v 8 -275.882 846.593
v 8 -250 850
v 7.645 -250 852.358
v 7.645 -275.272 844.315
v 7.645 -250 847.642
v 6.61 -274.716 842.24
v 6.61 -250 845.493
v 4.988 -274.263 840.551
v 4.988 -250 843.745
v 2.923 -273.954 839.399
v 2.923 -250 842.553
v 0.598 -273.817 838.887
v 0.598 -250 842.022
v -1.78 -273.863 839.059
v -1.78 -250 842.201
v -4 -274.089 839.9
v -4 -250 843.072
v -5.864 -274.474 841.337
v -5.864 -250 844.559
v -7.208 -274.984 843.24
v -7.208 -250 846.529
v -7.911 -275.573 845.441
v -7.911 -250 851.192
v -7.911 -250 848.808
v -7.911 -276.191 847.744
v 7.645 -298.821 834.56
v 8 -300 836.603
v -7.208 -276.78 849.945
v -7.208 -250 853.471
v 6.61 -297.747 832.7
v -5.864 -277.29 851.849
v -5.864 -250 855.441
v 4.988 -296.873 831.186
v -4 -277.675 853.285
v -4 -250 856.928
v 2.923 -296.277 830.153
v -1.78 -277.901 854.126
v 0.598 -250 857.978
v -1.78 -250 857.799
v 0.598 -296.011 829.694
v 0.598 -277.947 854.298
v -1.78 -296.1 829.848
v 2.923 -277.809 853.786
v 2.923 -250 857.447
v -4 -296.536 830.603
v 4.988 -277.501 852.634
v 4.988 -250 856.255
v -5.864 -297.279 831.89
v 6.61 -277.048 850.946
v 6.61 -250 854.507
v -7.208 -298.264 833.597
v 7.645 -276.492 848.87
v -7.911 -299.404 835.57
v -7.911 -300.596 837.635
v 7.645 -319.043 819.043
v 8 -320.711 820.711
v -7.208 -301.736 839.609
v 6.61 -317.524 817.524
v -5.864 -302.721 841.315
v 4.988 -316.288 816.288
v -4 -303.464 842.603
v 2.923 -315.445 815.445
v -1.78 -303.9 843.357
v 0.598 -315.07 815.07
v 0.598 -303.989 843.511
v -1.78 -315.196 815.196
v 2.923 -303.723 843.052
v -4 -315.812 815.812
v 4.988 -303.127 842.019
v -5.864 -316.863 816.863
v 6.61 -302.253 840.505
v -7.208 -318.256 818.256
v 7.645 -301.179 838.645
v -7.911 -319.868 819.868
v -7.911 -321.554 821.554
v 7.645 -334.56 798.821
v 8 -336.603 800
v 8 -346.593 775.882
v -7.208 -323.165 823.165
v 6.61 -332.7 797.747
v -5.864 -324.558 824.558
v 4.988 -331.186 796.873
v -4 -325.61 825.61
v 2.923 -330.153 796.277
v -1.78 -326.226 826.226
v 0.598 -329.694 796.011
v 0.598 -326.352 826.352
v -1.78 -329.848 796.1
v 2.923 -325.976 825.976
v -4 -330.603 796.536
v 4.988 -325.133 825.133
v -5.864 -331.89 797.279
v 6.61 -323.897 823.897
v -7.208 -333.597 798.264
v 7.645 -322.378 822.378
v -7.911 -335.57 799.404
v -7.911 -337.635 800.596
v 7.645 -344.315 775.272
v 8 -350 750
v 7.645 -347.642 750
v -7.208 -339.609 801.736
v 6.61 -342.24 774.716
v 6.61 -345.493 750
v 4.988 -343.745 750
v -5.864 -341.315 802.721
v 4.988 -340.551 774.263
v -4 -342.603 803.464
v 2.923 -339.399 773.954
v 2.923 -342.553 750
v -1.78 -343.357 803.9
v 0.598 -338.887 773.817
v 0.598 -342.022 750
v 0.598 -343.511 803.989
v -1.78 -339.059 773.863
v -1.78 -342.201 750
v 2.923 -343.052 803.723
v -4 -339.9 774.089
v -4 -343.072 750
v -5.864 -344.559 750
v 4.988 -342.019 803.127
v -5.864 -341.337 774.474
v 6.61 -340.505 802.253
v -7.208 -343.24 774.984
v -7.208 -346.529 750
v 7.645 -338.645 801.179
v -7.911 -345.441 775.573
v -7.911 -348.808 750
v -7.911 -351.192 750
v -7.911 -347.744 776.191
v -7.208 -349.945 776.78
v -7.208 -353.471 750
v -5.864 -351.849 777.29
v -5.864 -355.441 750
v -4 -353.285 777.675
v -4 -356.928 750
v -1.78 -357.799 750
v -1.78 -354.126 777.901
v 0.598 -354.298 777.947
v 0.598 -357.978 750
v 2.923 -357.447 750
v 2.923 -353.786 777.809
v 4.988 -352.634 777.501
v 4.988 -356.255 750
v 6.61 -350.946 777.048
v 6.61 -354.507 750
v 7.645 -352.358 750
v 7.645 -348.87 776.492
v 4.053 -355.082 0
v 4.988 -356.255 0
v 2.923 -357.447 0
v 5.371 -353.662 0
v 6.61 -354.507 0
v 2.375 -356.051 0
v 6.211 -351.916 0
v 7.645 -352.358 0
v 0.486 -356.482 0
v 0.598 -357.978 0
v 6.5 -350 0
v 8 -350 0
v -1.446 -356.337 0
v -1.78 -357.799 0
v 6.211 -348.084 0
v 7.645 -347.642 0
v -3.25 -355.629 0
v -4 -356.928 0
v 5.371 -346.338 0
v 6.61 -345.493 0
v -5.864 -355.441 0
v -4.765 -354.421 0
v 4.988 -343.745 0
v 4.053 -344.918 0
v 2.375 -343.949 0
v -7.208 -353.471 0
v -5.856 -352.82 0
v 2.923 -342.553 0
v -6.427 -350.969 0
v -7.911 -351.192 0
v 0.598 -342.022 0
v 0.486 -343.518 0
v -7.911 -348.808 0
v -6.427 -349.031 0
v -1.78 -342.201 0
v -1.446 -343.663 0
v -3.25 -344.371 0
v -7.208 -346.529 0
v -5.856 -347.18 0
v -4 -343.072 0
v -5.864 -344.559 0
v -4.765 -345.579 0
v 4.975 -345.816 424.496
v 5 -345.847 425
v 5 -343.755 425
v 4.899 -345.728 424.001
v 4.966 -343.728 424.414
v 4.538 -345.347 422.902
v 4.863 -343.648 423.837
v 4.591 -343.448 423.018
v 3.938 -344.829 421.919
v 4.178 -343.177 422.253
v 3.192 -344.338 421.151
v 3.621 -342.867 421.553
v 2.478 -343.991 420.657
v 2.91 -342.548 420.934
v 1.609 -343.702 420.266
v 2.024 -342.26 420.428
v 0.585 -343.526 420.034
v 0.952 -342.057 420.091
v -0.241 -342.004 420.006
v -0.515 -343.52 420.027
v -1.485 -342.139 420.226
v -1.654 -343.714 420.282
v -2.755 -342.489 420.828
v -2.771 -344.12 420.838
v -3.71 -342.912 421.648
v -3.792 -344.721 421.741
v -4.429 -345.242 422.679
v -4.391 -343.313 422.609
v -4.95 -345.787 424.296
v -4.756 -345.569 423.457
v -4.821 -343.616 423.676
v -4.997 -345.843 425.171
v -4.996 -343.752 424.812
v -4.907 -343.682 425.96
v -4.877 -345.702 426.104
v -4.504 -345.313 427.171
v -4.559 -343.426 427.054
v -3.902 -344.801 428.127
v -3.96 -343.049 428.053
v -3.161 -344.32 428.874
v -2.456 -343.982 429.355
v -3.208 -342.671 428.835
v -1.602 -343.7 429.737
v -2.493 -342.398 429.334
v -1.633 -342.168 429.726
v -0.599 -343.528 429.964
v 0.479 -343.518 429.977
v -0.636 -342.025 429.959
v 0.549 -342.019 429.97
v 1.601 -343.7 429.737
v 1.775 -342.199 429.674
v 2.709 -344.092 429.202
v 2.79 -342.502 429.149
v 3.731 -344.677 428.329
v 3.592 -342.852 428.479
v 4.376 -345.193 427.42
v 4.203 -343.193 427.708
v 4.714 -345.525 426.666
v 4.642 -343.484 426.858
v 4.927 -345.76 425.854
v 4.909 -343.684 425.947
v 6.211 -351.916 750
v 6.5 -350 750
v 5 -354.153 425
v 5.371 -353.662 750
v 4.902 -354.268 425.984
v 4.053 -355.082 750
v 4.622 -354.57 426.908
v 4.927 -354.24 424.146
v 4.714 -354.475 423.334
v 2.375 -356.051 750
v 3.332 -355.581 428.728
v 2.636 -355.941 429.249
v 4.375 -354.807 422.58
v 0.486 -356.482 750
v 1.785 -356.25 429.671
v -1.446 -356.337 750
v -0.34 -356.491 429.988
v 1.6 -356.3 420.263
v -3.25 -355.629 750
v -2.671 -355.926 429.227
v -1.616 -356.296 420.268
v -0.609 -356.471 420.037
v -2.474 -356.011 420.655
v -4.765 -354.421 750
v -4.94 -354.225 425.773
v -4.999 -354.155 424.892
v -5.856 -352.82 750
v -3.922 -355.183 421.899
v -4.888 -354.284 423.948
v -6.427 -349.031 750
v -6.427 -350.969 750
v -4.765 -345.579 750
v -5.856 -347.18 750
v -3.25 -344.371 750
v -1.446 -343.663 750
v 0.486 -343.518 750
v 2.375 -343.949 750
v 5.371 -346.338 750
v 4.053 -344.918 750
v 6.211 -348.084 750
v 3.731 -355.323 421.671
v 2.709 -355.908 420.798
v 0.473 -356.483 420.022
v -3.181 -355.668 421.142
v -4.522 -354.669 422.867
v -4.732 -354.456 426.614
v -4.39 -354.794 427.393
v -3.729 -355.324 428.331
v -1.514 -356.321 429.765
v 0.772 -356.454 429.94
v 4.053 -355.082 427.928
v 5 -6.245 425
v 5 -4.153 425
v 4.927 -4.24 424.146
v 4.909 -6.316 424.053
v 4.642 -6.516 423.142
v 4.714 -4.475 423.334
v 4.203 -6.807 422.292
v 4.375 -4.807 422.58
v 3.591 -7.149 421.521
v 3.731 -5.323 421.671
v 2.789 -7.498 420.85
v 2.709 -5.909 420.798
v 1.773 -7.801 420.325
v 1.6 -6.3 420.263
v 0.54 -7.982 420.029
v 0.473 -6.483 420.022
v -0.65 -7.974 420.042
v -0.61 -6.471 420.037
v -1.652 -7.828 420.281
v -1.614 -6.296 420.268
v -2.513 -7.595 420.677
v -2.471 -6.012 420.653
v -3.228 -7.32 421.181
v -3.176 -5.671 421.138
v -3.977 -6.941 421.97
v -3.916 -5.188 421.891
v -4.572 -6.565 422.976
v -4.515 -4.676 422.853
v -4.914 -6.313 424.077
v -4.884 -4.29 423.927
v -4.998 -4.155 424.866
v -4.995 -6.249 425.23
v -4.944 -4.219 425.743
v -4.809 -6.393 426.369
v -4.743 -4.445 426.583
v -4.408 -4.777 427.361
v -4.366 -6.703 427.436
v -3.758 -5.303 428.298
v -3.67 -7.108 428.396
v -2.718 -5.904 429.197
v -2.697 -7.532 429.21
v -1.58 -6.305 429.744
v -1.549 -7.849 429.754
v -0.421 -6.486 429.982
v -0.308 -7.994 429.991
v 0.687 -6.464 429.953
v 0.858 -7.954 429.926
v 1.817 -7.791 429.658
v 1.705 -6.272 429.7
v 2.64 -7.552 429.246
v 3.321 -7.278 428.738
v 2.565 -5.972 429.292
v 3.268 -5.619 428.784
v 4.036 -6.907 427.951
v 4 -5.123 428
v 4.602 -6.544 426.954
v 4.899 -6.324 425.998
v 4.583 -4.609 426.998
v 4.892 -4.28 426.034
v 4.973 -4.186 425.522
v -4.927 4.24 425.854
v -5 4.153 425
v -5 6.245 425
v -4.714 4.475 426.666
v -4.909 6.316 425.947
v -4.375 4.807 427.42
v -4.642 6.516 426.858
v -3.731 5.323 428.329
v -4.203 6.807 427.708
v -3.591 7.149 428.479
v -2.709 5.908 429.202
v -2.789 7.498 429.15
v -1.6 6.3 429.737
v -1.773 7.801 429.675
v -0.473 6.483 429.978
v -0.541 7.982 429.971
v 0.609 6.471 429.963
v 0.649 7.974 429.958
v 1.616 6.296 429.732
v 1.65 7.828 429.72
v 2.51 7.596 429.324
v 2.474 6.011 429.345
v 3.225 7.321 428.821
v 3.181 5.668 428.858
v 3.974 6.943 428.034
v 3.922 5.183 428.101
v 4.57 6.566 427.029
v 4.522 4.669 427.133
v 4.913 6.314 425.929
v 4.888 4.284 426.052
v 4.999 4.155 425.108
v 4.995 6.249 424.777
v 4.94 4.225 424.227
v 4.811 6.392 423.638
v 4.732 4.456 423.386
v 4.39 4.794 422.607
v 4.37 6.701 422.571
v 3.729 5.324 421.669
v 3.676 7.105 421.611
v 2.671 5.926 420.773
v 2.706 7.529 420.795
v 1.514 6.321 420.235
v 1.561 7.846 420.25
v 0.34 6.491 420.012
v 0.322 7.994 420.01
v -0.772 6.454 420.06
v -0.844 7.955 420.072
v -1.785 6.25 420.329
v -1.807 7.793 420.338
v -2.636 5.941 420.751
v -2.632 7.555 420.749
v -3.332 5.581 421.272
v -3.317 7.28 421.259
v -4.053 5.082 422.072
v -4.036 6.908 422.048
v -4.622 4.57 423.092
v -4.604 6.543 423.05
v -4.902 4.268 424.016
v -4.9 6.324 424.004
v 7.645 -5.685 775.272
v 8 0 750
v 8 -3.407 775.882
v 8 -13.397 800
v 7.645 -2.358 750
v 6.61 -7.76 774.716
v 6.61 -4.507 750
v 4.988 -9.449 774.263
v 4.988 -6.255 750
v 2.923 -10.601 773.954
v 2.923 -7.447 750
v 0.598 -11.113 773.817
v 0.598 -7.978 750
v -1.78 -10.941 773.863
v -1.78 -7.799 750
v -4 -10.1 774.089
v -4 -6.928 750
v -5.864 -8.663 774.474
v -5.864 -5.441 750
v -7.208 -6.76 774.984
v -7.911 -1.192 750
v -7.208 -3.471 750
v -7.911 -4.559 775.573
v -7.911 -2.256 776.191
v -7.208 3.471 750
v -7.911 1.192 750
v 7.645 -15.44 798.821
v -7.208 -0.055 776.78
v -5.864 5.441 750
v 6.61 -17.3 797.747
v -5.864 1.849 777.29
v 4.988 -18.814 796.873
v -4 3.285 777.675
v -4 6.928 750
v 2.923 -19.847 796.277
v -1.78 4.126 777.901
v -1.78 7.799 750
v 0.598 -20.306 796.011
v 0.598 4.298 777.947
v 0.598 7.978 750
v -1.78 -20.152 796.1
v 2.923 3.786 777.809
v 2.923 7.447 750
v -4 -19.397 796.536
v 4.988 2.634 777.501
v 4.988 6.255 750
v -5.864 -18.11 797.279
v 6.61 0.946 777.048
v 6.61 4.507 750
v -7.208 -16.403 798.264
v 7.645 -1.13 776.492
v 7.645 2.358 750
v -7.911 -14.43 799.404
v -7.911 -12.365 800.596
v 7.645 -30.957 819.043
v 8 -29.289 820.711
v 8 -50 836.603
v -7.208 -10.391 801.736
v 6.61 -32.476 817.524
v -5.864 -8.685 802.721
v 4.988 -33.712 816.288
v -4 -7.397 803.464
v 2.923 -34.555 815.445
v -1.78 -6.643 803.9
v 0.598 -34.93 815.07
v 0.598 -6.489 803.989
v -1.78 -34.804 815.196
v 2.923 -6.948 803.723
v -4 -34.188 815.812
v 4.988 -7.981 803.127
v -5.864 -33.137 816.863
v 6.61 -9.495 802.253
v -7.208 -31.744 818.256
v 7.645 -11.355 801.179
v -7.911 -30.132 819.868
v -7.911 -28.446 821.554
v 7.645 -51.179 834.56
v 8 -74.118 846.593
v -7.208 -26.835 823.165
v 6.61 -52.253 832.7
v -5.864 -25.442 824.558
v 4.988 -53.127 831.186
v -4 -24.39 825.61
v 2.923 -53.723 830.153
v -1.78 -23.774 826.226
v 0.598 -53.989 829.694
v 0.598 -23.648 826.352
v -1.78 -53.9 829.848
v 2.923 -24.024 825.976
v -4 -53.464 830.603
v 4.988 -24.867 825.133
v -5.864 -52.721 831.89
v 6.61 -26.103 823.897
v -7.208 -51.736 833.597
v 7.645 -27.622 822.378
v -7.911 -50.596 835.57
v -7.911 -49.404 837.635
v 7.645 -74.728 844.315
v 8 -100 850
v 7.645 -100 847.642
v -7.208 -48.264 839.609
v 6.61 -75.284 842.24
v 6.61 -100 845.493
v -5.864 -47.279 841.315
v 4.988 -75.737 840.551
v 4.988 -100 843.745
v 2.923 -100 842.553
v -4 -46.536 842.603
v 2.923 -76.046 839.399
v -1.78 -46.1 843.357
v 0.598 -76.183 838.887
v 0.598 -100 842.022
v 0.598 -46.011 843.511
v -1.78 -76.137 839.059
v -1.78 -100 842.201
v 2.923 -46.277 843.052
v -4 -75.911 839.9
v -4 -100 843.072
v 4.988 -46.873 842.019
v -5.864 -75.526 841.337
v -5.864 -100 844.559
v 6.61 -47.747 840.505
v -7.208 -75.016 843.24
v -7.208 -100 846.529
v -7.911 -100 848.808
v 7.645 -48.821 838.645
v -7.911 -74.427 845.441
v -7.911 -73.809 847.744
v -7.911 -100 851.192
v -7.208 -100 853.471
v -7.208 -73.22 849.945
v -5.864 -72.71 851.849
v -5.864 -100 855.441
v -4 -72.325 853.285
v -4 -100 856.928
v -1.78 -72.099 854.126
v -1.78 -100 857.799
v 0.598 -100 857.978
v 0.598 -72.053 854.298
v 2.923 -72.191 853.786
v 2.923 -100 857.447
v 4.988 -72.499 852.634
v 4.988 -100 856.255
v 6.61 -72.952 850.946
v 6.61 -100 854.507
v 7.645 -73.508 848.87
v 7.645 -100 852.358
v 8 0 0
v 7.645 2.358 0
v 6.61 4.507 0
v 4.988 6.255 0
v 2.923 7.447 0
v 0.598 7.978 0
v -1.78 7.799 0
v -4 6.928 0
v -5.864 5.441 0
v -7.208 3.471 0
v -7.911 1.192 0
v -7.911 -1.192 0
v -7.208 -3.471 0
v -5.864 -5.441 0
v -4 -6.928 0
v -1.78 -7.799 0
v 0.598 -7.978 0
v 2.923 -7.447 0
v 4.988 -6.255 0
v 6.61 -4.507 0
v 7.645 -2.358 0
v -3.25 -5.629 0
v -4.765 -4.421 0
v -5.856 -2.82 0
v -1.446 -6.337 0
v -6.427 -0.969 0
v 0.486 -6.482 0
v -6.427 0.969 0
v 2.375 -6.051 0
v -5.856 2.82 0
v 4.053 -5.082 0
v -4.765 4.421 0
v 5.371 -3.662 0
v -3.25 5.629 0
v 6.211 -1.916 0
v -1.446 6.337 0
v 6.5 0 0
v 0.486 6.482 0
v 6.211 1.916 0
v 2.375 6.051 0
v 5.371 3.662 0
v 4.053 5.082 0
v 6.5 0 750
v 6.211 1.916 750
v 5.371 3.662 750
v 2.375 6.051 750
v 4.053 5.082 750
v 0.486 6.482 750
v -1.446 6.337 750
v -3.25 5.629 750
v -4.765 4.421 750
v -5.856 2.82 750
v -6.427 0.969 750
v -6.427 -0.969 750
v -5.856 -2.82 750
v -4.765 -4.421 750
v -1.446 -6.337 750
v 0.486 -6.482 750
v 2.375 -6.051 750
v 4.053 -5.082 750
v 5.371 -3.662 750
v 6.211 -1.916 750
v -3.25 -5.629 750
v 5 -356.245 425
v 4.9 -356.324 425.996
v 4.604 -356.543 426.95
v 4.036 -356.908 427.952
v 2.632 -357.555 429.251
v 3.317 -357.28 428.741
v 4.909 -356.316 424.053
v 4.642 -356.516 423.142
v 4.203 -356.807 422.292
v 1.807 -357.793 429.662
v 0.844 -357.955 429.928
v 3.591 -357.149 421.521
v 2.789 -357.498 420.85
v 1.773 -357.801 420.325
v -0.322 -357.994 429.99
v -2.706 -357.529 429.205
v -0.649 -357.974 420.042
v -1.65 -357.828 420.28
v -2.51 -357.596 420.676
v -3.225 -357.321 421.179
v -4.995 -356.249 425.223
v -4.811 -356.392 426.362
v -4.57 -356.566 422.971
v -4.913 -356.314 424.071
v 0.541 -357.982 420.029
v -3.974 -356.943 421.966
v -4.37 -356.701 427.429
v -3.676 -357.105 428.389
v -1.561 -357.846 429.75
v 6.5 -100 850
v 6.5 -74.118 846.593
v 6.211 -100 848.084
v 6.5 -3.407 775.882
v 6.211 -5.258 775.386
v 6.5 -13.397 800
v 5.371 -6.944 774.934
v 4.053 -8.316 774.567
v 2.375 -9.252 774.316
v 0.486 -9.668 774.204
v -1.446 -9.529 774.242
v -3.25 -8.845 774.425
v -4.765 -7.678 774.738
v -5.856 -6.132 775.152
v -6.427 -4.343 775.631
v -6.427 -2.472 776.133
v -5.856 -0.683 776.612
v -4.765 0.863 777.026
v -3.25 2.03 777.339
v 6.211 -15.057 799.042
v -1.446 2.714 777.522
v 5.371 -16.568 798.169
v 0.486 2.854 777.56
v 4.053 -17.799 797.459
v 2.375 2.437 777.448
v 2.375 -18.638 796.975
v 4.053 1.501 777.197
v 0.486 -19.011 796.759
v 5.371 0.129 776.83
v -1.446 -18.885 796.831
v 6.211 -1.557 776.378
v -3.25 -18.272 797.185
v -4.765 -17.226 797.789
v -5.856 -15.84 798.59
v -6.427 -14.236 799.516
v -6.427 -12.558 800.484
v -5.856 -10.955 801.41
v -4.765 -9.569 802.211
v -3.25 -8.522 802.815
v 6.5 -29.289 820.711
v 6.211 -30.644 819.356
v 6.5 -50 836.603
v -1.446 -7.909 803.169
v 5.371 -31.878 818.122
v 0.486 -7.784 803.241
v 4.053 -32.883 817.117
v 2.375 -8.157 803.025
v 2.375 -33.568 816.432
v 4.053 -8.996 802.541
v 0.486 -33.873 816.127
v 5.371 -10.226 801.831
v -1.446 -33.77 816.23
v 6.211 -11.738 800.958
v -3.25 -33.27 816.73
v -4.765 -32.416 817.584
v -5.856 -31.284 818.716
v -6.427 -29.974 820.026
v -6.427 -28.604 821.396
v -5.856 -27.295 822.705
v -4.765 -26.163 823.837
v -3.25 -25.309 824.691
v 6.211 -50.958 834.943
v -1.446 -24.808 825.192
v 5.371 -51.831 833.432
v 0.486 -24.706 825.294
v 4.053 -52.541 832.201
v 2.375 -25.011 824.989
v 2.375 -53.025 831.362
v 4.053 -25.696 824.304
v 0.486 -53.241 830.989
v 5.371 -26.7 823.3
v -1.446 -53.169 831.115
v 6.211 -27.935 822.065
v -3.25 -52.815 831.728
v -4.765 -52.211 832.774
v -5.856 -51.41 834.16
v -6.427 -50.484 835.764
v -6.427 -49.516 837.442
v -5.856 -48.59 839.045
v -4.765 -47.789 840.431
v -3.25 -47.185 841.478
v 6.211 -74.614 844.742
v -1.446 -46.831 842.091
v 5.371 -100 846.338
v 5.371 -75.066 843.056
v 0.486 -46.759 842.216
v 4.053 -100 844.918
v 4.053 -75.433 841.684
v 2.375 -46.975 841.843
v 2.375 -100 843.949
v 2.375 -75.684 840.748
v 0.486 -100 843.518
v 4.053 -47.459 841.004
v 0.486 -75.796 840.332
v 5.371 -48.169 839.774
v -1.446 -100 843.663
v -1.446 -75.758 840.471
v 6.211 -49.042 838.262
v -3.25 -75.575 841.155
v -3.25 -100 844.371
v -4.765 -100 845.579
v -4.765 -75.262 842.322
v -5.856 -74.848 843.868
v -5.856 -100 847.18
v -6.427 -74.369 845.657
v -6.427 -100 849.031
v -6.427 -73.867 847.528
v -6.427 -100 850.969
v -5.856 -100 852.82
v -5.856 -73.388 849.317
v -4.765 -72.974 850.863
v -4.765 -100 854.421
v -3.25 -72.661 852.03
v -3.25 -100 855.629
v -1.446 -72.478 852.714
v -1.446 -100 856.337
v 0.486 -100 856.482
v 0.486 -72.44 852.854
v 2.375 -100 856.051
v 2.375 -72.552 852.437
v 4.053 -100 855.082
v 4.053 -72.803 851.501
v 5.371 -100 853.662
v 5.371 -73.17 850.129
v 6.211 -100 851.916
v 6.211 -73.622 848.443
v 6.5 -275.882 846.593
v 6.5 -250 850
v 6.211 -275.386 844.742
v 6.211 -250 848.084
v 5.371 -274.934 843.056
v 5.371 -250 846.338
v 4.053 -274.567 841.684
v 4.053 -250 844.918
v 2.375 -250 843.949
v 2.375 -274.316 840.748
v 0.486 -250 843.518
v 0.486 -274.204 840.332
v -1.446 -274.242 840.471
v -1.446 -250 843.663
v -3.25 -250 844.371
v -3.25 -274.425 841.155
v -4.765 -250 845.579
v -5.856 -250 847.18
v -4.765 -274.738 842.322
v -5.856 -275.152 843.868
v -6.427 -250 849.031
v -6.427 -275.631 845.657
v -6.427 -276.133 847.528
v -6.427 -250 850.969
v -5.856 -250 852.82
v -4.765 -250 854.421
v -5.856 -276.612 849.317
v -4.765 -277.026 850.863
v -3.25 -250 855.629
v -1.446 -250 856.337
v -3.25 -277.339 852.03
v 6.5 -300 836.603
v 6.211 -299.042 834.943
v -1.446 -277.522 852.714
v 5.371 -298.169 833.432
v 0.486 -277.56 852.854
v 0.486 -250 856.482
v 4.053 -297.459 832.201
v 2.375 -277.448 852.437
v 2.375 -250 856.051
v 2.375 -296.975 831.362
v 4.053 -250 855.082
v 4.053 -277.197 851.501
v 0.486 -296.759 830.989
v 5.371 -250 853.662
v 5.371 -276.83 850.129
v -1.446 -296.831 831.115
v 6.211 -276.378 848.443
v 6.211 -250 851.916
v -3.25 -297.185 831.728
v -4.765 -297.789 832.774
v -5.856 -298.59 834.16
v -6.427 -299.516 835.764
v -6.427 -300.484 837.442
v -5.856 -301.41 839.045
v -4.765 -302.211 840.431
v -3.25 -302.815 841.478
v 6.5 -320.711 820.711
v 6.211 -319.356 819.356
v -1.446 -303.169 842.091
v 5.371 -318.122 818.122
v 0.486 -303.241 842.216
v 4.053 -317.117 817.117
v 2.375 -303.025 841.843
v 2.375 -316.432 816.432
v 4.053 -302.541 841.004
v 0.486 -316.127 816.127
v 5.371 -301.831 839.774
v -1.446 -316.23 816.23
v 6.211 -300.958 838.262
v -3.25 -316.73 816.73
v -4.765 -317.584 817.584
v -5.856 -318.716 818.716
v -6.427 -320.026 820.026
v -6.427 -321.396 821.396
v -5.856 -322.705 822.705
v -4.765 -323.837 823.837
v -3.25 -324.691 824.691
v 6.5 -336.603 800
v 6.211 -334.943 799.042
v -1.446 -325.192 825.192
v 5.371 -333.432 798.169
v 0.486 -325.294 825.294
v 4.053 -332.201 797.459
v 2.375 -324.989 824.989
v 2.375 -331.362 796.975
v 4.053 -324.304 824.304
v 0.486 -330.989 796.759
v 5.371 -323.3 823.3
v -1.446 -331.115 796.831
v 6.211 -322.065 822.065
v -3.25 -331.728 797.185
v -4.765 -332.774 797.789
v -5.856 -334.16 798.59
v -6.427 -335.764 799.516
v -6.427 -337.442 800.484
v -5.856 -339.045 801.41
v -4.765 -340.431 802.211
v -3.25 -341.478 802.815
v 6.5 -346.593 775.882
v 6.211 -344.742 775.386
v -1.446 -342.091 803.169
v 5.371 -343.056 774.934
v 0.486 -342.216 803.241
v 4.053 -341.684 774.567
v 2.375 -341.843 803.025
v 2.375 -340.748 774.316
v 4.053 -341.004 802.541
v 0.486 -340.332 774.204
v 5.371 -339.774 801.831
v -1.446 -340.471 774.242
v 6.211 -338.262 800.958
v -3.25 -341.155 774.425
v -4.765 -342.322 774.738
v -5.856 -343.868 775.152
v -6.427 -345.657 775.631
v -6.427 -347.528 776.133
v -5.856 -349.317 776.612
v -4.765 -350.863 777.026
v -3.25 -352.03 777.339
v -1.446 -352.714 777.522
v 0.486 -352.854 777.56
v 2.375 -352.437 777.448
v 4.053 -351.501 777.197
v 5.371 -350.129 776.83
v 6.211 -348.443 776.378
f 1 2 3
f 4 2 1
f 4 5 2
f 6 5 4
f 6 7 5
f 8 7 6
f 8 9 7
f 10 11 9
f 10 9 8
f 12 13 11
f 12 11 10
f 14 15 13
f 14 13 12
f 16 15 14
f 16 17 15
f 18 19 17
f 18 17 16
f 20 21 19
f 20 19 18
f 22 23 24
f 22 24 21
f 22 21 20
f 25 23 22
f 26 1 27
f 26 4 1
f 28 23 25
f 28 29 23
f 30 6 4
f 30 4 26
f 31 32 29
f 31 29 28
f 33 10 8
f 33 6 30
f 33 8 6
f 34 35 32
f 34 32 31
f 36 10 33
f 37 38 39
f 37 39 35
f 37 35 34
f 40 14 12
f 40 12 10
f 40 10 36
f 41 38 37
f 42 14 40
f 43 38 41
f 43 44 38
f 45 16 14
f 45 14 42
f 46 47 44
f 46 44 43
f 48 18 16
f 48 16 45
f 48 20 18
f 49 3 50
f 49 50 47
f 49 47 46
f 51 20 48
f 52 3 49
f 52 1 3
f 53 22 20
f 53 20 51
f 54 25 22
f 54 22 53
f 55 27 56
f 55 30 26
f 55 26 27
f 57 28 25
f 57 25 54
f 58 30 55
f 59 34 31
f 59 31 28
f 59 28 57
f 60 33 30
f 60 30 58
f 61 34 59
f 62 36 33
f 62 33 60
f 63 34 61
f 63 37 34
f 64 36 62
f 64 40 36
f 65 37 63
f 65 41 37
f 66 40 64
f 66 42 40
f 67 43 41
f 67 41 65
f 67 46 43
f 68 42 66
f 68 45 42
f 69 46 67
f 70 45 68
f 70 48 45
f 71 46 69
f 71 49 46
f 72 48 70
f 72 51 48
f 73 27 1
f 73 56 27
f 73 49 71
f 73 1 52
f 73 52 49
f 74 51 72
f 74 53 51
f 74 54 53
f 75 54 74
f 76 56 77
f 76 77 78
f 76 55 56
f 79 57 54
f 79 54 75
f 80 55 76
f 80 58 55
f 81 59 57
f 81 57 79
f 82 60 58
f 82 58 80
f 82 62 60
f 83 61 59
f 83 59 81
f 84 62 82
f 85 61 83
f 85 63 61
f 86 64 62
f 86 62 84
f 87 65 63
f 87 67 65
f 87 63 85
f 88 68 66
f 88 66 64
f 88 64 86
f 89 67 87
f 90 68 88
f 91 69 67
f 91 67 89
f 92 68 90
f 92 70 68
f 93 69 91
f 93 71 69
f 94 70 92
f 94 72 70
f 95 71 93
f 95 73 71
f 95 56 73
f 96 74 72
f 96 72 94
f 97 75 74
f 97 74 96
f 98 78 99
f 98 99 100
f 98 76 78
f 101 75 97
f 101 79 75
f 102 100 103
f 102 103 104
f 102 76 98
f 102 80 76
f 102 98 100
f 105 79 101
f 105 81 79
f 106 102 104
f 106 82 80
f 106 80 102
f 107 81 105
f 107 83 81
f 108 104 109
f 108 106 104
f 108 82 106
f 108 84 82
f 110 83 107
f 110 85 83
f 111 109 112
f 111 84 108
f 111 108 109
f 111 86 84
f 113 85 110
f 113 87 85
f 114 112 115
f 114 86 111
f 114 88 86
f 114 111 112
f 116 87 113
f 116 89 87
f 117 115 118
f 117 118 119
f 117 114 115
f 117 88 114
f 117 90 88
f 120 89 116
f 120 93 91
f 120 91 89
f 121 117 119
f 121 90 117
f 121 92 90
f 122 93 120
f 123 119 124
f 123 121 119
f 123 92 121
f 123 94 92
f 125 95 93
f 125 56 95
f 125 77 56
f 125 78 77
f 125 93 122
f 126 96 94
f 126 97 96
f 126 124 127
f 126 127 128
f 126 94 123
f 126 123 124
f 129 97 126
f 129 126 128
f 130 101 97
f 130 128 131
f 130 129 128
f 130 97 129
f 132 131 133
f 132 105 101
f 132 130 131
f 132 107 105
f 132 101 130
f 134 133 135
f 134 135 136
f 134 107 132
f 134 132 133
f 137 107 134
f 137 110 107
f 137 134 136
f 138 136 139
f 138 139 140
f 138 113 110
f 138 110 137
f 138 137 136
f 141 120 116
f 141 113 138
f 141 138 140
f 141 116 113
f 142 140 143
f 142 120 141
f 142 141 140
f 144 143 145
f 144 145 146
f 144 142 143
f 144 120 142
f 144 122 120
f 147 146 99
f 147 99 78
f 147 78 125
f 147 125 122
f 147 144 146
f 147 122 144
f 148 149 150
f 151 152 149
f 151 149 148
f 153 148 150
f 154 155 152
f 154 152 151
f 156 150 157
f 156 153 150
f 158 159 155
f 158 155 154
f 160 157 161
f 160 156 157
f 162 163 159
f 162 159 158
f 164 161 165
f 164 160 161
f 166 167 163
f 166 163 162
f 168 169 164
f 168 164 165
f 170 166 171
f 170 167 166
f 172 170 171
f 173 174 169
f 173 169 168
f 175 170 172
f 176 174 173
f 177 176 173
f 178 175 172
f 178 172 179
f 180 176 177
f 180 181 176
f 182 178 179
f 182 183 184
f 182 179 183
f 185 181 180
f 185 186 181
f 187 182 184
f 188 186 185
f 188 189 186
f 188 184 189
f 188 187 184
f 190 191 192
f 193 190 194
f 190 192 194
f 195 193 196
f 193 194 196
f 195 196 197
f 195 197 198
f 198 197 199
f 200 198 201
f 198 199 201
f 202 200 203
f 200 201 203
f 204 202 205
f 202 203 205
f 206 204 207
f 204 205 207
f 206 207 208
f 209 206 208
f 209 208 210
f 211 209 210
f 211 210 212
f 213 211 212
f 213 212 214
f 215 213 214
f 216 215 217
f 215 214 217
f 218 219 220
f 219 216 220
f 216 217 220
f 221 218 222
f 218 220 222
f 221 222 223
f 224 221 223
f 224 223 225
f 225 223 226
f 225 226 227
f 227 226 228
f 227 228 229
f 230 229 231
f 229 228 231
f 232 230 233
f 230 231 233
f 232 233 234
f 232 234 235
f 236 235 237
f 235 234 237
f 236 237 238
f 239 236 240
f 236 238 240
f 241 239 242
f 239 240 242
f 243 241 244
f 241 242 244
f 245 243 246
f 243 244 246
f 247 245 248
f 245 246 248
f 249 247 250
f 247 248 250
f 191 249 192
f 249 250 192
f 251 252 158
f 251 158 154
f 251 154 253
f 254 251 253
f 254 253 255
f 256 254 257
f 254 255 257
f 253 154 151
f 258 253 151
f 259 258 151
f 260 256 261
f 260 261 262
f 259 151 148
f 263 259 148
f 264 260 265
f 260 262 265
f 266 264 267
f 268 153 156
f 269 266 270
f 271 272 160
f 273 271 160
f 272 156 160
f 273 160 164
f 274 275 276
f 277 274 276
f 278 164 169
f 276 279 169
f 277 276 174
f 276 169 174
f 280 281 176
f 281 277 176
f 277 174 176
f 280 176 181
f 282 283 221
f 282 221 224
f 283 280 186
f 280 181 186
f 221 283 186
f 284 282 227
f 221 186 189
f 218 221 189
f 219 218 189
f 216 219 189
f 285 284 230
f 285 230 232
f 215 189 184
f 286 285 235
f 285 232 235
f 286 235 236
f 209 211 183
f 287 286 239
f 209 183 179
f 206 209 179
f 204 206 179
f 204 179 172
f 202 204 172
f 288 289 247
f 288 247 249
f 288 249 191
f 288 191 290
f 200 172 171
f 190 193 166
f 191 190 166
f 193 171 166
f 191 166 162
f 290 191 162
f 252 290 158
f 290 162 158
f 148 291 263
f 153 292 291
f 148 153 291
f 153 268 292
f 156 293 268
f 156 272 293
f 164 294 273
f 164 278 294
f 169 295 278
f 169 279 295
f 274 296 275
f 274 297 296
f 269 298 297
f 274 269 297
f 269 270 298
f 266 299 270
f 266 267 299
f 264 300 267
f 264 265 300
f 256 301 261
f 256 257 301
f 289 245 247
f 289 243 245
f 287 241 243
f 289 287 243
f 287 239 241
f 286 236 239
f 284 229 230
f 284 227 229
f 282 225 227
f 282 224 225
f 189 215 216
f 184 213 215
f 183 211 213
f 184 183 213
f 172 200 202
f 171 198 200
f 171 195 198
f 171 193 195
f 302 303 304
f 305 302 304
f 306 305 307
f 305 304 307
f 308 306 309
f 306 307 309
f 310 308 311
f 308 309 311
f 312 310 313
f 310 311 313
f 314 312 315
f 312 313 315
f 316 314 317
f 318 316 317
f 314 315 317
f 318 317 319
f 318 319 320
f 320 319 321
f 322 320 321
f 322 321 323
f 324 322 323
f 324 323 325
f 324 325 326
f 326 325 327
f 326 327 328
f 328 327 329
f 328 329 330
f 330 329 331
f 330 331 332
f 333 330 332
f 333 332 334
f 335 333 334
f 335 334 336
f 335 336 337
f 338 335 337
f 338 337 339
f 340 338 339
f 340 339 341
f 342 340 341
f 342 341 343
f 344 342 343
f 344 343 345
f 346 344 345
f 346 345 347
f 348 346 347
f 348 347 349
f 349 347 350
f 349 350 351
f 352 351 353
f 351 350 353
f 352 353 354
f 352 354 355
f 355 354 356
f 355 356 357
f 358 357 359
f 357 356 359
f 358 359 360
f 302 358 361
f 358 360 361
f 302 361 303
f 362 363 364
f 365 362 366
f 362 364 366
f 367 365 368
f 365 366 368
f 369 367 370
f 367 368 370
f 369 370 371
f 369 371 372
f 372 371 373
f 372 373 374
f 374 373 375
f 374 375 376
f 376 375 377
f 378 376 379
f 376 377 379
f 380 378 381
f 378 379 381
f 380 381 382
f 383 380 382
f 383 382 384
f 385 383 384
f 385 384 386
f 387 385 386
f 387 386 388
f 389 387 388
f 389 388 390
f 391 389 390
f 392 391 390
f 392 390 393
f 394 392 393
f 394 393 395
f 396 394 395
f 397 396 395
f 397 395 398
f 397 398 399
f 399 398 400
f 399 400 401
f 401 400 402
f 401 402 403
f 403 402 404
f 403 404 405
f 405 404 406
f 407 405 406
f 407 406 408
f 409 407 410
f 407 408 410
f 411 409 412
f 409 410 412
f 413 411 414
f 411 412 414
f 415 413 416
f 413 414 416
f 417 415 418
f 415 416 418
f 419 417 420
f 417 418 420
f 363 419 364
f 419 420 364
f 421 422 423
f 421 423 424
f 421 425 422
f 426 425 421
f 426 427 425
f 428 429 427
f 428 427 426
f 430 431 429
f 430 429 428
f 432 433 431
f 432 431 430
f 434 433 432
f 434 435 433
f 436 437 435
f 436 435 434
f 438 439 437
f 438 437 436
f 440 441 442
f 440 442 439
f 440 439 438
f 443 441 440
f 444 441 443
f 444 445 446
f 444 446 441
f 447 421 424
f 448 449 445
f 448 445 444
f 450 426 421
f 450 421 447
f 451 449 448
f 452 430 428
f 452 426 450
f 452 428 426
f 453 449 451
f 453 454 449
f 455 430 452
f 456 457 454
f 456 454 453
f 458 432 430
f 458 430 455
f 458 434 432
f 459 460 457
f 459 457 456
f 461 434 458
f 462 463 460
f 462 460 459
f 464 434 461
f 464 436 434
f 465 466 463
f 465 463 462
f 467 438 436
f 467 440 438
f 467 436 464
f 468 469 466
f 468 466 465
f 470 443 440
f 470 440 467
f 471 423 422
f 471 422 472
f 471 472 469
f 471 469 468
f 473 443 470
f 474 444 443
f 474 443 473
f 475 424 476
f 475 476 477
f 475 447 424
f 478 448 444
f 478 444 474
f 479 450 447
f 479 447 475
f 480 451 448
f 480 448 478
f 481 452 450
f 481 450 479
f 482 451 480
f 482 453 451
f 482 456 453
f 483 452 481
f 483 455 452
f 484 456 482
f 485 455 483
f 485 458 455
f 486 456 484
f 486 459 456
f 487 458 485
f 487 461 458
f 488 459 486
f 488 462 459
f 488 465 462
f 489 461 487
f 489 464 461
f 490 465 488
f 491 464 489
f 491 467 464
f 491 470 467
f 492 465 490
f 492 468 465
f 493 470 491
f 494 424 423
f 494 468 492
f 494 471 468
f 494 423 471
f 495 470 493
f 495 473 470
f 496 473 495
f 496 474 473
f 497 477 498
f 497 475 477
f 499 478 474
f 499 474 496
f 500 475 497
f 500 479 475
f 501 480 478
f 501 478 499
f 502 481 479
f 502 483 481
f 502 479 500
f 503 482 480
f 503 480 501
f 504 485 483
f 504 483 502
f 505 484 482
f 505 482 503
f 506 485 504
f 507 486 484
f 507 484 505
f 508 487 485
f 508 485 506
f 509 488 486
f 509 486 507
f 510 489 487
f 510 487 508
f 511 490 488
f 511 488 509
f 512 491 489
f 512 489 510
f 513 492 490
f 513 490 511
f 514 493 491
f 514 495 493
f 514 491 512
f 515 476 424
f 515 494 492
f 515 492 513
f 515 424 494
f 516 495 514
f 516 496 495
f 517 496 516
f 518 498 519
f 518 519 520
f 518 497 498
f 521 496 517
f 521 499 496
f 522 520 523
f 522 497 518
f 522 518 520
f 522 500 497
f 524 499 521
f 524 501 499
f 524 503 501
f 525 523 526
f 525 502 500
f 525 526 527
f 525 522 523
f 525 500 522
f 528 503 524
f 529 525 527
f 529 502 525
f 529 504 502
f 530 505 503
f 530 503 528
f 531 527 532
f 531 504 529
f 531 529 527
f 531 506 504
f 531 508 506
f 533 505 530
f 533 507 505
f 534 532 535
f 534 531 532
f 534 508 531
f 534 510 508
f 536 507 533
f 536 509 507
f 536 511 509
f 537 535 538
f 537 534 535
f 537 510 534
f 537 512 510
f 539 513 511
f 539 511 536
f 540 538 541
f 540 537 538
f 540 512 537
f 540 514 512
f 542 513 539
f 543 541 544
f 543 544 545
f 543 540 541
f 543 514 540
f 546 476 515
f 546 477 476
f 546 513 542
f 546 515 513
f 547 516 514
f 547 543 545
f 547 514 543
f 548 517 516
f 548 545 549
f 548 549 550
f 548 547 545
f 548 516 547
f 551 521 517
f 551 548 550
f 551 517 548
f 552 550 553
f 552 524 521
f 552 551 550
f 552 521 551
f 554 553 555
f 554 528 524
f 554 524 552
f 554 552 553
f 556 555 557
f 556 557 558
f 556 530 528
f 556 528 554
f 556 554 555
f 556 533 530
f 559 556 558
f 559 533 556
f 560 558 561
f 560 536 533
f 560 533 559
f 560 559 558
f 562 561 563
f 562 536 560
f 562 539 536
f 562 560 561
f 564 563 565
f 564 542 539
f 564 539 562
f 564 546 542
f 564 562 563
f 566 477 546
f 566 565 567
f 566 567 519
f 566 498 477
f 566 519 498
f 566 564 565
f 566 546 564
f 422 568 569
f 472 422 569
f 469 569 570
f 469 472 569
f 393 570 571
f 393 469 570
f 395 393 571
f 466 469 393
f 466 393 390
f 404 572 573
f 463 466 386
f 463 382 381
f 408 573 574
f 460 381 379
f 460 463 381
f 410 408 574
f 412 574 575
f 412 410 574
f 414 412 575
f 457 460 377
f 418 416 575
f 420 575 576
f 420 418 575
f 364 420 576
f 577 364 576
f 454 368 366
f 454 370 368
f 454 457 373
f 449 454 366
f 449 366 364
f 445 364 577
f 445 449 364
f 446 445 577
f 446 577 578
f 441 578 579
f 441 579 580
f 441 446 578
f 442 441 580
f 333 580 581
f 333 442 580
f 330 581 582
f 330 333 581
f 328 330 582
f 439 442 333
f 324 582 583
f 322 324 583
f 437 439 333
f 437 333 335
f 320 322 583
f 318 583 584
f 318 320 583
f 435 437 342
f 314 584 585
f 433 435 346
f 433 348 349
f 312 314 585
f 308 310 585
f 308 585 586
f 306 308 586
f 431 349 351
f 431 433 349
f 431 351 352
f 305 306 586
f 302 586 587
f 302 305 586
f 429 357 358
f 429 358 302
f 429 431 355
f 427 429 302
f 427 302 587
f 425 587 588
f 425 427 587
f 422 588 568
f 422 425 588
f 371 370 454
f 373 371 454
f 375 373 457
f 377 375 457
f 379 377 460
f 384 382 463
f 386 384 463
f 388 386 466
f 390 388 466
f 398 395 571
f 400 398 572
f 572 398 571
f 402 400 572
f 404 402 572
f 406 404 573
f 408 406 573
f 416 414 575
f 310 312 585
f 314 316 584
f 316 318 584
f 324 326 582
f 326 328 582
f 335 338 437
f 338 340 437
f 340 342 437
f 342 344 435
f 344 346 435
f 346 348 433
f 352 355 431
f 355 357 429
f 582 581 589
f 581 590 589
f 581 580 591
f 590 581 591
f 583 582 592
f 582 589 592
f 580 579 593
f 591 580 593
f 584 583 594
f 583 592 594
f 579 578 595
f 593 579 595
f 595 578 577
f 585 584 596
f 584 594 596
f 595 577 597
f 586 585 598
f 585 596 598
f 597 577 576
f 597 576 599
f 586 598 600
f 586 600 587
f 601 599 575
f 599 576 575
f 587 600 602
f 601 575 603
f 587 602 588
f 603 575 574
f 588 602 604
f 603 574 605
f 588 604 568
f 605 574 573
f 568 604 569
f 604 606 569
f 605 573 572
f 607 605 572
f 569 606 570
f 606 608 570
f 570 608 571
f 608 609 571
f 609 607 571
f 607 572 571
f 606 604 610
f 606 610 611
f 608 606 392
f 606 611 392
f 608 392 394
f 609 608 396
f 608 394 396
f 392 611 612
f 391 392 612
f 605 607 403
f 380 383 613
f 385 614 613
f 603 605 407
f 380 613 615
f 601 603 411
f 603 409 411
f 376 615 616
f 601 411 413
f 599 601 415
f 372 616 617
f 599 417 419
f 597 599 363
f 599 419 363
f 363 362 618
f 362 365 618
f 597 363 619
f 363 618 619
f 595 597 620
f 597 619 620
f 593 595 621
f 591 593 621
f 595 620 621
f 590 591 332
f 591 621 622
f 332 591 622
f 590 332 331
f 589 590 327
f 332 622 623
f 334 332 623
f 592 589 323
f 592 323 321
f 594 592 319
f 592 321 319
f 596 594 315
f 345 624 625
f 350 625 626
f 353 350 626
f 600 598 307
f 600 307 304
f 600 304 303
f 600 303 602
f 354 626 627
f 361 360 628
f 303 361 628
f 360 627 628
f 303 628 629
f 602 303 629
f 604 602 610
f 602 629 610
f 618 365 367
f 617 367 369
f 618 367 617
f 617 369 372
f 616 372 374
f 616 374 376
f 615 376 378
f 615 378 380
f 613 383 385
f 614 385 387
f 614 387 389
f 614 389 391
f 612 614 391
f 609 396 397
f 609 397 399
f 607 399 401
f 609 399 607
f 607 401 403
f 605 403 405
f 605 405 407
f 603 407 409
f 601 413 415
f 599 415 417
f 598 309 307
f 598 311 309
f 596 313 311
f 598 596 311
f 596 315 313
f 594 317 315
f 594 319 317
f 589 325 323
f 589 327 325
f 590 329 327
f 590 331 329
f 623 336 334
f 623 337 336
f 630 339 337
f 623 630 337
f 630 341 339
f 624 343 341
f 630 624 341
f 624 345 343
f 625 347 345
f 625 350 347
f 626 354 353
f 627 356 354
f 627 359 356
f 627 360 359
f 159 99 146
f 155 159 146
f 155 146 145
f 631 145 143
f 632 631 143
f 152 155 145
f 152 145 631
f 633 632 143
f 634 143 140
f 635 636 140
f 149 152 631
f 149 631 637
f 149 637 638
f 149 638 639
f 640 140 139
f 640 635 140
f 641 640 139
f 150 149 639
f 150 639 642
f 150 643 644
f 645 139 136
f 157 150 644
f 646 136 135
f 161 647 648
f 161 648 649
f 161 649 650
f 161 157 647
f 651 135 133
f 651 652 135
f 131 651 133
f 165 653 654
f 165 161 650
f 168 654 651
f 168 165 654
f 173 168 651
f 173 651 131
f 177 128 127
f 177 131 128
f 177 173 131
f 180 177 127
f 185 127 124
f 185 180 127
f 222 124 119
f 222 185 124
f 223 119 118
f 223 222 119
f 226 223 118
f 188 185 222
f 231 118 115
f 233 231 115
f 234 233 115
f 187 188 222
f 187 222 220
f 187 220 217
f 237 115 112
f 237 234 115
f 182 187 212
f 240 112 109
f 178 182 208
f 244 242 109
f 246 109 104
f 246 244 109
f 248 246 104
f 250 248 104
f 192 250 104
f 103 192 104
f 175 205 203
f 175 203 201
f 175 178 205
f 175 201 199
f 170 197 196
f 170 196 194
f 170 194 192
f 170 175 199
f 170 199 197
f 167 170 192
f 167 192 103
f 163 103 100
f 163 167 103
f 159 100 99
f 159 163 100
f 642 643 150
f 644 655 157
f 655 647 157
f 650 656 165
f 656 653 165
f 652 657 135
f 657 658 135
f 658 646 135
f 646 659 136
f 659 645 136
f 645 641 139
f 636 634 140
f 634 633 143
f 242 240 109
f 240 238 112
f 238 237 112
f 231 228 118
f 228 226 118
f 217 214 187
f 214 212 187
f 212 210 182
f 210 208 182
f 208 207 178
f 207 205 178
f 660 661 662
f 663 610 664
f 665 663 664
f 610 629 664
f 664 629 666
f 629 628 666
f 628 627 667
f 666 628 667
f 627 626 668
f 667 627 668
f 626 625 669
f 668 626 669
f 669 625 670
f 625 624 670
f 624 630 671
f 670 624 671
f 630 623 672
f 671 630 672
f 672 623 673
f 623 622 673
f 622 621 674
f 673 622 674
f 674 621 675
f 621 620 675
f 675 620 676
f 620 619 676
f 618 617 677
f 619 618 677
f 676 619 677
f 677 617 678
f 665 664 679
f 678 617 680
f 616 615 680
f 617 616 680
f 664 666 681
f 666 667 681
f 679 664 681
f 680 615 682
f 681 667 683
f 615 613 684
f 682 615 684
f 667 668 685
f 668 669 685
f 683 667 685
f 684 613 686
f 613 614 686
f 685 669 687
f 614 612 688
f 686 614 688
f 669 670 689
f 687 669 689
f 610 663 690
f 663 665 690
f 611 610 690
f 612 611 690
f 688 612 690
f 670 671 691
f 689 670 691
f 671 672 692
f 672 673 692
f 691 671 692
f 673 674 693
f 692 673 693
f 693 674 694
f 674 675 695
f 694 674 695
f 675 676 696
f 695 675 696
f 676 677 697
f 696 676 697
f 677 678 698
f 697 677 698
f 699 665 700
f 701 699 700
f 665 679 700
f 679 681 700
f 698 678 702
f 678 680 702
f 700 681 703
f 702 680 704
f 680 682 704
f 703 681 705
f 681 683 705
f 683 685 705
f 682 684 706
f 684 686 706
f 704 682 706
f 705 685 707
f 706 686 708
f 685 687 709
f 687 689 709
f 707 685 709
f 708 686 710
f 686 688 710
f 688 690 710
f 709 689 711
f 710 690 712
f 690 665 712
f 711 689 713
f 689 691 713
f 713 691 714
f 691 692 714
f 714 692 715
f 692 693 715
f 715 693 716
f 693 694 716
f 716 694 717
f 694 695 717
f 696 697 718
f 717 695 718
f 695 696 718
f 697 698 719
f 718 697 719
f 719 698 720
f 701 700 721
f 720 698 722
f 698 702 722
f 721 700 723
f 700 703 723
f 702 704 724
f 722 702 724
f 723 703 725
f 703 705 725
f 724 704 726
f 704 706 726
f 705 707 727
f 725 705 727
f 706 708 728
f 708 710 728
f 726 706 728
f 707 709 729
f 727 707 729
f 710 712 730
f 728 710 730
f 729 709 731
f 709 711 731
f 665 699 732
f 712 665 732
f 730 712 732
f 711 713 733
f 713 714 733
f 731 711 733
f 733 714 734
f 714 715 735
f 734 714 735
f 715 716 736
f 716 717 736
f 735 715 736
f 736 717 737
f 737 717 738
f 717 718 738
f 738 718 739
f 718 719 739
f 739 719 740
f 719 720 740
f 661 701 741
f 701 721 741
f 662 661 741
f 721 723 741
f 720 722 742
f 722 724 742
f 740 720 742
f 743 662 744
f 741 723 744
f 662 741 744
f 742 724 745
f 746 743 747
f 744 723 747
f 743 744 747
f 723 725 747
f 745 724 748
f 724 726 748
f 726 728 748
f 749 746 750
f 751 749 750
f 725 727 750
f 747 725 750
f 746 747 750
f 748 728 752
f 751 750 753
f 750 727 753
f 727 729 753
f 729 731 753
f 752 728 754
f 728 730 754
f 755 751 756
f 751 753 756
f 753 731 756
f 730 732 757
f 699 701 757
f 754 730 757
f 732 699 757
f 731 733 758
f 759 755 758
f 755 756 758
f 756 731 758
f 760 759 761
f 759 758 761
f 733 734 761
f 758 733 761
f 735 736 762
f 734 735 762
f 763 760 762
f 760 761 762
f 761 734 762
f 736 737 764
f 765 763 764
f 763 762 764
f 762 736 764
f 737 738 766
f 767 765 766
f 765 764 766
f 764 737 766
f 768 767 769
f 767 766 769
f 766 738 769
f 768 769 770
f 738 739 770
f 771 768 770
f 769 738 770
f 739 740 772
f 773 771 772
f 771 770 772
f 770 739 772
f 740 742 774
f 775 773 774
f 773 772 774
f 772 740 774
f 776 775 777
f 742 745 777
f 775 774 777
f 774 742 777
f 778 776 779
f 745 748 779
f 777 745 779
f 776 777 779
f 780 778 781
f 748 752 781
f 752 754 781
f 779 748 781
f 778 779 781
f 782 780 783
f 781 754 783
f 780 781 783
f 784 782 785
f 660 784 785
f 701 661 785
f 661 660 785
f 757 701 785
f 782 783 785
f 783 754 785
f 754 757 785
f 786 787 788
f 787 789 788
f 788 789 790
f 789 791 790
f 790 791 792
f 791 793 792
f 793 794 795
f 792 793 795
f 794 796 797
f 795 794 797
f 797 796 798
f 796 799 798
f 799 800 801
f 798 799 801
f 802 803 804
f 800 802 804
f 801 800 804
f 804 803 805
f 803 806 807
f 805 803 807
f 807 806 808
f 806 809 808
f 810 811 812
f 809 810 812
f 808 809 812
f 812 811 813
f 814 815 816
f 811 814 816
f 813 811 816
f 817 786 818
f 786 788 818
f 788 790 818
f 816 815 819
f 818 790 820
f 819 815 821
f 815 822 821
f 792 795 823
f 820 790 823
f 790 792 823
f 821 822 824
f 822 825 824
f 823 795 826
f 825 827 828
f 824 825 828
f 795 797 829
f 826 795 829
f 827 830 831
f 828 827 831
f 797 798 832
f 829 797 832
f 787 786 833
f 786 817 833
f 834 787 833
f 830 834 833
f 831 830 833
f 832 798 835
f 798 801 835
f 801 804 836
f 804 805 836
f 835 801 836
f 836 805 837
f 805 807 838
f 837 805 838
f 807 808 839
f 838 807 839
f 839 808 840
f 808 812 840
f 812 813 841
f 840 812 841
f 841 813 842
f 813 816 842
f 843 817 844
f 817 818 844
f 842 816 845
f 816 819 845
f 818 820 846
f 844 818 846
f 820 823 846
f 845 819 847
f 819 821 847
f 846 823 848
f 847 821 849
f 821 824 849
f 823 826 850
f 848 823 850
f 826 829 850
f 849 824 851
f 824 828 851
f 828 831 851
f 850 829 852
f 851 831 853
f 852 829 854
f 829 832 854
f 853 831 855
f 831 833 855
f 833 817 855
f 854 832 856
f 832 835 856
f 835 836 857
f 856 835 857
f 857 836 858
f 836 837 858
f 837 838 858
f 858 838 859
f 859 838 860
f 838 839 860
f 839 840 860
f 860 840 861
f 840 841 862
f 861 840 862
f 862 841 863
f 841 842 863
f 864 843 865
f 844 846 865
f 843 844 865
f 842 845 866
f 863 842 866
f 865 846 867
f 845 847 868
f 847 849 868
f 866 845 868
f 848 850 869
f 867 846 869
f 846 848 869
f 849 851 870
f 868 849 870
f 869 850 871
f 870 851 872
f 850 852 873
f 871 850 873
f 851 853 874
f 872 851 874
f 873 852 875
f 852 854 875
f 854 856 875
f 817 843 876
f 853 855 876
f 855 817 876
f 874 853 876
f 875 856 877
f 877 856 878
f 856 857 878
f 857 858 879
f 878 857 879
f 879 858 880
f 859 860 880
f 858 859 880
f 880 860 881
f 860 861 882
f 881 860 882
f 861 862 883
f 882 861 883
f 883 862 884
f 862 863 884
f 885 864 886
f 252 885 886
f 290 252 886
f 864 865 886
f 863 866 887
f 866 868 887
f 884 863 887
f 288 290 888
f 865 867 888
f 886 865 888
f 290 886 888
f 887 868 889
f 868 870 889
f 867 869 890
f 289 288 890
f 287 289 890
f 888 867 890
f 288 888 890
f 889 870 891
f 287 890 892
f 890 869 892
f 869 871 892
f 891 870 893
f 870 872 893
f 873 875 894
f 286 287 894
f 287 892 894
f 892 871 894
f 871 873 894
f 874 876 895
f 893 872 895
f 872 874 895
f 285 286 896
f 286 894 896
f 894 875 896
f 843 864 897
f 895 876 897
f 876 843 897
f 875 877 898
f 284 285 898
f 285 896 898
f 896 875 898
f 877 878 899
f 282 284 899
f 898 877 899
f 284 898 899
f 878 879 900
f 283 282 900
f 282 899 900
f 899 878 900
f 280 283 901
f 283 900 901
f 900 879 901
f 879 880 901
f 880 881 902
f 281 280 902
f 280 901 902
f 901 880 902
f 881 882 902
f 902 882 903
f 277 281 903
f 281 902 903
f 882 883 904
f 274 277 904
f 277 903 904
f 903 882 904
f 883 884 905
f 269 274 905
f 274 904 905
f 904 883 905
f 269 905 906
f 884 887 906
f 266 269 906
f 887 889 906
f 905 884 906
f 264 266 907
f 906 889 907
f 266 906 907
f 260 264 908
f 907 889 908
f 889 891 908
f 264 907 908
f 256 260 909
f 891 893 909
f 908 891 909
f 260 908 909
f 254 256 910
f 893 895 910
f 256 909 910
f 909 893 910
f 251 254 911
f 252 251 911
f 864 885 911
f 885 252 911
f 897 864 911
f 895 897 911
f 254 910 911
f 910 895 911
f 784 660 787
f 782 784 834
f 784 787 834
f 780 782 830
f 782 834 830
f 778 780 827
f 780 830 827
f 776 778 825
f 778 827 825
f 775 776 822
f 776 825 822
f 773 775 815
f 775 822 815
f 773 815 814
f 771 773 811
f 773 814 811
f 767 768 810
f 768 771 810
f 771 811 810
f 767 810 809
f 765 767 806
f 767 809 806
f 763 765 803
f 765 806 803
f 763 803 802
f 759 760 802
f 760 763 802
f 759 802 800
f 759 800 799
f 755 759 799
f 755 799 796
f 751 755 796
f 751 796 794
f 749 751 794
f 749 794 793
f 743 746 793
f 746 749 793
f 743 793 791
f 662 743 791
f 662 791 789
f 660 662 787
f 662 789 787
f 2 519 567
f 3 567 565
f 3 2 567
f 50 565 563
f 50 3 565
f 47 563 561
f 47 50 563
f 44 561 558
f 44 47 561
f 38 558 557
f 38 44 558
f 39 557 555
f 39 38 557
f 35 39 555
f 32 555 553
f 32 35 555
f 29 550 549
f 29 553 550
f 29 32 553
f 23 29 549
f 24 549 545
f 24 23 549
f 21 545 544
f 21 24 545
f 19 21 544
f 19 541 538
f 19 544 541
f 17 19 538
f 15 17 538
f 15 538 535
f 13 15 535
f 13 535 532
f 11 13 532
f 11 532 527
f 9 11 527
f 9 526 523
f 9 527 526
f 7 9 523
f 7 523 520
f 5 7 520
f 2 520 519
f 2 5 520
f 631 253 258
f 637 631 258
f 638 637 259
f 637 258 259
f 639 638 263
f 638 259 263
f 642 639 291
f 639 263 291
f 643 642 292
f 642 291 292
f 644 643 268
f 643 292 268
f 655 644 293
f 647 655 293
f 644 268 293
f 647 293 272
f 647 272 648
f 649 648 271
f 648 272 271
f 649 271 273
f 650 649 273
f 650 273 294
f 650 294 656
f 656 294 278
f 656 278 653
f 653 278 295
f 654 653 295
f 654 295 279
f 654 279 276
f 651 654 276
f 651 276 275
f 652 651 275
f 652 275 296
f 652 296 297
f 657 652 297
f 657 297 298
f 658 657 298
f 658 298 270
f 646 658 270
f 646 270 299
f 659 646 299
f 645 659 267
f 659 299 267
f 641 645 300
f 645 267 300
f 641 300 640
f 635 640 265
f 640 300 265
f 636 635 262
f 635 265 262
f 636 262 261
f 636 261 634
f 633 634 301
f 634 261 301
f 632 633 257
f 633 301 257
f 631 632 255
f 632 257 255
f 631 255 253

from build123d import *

# Parameters (mm, degrees)
F1_R     = 8
F3_T     = -1.5
F5_D     = 10
F5_DEPTH = 358.0010001
F6_D     = 10


with BuildPart() as f2:
    # F2: sweep along a path in F0
    with BuildLine(Plane.YZ) as f2_path:
        Line((0, 0), (0, 750))
        ThreePointArc((0, 750), (-29.2893218813, 820.7106781187), (-100, 850))
        Line((-100, 850), (-250, 850))
        ThreePointArc((-250, 850), (-320.7106781187, 820.7106781187), (-350, 750))
        Line((-350, 750), (-350, 0))
    # F1 (on Top) → F2 (sweep)
    with BuildSketch(Plane.XY):
        Circle(F1_R)
    sweep(path=f2_path.line)

    # F3
    f3_openings = [f2.faces().sort_by_distance(p)[0] for p in [
        (0, -350, 0),
        (0, 0, 0),
    ]]
    offset(amount=F3_T, openings=f3_openings)

    # F5 (through all, one way)
    with BuildSketch(Plane(origin=(0, 0, 0), x_dir=(1, 0, 0), z_dir=(0, 1, 0))):
        with Locations((0, -425)):
            Circle(F5_D / 2)
    extrude(amount=-F5_DEPTH, mode=Mode.SUBTRACT)

    # F6 (through all)
    with Locations(Plane.XZ):
        with Locations((0, 425)):
            Hole(F6_D / 2)


solid = f2.part
